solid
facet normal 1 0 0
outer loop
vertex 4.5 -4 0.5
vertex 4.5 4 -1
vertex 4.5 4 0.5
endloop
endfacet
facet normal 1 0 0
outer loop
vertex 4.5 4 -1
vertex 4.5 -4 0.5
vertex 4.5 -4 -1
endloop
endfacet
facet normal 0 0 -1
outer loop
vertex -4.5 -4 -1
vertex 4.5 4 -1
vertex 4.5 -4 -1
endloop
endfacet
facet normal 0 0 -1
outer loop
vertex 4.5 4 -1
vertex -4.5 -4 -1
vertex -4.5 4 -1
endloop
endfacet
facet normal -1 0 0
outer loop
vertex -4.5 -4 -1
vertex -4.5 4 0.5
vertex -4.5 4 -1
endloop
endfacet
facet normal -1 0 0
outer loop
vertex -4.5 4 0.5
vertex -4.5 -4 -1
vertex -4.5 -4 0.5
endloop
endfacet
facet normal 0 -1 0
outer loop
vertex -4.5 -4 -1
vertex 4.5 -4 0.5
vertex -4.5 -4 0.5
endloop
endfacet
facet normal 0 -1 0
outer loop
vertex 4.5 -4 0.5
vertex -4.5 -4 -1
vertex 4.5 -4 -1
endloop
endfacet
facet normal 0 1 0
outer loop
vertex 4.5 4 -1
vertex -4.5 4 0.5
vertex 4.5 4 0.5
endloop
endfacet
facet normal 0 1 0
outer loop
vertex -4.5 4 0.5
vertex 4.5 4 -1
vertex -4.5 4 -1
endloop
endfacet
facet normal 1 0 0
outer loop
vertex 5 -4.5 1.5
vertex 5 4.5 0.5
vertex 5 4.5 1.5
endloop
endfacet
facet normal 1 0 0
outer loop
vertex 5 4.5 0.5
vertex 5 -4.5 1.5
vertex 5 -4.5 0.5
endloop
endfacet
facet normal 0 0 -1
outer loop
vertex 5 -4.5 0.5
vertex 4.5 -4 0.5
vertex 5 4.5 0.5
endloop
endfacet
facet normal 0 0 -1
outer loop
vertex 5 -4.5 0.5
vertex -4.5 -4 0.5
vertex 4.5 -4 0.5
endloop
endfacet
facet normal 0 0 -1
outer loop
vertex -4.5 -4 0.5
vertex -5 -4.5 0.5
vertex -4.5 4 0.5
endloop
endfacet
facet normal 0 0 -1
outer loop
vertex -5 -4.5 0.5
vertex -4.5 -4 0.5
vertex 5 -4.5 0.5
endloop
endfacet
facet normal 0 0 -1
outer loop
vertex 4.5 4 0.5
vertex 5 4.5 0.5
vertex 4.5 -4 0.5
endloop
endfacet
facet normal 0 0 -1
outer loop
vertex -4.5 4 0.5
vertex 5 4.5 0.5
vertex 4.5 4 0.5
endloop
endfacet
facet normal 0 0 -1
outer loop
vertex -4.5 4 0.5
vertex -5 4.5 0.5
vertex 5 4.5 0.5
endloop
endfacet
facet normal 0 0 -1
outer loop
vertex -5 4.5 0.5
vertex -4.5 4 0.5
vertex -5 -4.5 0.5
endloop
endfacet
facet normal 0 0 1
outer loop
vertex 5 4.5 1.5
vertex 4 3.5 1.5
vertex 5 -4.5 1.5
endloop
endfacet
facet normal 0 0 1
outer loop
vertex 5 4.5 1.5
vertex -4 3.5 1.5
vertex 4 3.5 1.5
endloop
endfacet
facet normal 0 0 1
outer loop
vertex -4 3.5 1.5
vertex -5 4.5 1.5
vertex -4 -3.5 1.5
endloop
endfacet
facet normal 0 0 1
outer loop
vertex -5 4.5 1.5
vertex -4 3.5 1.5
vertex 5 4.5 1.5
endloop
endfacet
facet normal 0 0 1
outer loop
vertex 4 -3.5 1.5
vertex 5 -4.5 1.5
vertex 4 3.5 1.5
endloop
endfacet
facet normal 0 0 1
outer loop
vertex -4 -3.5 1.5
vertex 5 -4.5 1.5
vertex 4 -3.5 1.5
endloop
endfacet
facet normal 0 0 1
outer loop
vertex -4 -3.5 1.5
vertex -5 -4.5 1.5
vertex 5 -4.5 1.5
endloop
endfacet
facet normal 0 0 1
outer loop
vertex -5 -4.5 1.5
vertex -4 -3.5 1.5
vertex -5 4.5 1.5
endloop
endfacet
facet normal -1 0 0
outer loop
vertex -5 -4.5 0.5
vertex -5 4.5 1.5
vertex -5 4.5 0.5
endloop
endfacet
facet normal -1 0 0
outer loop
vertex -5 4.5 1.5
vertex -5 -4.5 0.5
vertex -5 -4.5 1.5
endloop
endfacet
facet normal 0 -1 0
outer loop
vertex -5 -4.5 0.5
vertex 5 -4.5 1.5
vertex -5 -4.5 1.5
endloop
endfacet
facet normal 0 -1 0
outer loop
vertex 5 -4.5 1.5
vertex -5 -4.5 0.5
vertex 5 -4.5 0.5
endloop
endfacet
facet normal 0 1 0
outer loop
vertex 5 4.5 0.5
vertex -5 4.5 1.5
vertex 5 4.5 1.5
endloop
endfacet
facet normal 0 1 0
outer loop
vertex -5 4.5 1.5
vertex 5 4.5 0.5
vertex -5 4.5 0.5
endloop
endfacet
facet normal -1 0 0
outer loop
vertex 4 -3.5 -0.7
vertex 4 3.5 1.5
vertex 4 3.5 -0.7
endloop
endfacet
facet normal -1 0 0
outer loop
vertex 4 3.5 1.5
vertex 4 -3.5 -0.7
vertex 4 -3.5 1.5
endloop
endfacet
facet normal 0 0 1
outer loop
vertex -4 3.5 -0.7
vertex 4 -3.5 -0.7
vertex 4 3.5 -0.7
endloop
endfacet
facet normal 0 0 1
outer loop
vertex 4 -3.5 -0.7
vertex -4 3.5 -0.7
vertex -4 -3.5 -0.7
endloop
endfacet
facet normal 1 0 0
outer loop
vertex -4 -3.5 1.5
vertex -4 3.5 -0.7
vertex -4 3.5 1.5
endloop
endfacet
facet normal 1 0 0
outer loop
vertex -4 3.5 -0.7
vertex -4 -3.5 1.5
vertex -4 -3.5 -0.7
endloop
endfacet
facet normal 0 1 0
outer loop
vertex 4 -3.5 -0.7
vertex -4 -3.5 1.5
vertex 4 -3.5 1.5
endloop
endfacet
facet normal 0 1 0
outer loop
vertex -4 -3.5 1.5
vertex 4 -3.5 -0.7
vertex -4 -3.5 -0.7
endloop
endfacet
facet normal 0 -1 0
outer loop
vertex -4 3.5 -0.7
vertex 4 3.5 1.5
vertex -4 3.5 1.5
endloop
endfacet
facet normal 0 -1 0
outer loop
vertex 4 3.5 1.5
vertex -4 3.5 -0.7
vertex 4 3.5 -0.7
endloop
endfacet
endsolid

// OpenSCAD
module button() {
    color("red") difference() {
        union() {
            cube([9,8,2], center=true);
            translate([0,0,-1]) cube([10,9,1], center=true);
        }
        translate([0,0,-0.8]) cube([8,7,3], center=true);
    }
}
rotate([180,0,0]) button();
